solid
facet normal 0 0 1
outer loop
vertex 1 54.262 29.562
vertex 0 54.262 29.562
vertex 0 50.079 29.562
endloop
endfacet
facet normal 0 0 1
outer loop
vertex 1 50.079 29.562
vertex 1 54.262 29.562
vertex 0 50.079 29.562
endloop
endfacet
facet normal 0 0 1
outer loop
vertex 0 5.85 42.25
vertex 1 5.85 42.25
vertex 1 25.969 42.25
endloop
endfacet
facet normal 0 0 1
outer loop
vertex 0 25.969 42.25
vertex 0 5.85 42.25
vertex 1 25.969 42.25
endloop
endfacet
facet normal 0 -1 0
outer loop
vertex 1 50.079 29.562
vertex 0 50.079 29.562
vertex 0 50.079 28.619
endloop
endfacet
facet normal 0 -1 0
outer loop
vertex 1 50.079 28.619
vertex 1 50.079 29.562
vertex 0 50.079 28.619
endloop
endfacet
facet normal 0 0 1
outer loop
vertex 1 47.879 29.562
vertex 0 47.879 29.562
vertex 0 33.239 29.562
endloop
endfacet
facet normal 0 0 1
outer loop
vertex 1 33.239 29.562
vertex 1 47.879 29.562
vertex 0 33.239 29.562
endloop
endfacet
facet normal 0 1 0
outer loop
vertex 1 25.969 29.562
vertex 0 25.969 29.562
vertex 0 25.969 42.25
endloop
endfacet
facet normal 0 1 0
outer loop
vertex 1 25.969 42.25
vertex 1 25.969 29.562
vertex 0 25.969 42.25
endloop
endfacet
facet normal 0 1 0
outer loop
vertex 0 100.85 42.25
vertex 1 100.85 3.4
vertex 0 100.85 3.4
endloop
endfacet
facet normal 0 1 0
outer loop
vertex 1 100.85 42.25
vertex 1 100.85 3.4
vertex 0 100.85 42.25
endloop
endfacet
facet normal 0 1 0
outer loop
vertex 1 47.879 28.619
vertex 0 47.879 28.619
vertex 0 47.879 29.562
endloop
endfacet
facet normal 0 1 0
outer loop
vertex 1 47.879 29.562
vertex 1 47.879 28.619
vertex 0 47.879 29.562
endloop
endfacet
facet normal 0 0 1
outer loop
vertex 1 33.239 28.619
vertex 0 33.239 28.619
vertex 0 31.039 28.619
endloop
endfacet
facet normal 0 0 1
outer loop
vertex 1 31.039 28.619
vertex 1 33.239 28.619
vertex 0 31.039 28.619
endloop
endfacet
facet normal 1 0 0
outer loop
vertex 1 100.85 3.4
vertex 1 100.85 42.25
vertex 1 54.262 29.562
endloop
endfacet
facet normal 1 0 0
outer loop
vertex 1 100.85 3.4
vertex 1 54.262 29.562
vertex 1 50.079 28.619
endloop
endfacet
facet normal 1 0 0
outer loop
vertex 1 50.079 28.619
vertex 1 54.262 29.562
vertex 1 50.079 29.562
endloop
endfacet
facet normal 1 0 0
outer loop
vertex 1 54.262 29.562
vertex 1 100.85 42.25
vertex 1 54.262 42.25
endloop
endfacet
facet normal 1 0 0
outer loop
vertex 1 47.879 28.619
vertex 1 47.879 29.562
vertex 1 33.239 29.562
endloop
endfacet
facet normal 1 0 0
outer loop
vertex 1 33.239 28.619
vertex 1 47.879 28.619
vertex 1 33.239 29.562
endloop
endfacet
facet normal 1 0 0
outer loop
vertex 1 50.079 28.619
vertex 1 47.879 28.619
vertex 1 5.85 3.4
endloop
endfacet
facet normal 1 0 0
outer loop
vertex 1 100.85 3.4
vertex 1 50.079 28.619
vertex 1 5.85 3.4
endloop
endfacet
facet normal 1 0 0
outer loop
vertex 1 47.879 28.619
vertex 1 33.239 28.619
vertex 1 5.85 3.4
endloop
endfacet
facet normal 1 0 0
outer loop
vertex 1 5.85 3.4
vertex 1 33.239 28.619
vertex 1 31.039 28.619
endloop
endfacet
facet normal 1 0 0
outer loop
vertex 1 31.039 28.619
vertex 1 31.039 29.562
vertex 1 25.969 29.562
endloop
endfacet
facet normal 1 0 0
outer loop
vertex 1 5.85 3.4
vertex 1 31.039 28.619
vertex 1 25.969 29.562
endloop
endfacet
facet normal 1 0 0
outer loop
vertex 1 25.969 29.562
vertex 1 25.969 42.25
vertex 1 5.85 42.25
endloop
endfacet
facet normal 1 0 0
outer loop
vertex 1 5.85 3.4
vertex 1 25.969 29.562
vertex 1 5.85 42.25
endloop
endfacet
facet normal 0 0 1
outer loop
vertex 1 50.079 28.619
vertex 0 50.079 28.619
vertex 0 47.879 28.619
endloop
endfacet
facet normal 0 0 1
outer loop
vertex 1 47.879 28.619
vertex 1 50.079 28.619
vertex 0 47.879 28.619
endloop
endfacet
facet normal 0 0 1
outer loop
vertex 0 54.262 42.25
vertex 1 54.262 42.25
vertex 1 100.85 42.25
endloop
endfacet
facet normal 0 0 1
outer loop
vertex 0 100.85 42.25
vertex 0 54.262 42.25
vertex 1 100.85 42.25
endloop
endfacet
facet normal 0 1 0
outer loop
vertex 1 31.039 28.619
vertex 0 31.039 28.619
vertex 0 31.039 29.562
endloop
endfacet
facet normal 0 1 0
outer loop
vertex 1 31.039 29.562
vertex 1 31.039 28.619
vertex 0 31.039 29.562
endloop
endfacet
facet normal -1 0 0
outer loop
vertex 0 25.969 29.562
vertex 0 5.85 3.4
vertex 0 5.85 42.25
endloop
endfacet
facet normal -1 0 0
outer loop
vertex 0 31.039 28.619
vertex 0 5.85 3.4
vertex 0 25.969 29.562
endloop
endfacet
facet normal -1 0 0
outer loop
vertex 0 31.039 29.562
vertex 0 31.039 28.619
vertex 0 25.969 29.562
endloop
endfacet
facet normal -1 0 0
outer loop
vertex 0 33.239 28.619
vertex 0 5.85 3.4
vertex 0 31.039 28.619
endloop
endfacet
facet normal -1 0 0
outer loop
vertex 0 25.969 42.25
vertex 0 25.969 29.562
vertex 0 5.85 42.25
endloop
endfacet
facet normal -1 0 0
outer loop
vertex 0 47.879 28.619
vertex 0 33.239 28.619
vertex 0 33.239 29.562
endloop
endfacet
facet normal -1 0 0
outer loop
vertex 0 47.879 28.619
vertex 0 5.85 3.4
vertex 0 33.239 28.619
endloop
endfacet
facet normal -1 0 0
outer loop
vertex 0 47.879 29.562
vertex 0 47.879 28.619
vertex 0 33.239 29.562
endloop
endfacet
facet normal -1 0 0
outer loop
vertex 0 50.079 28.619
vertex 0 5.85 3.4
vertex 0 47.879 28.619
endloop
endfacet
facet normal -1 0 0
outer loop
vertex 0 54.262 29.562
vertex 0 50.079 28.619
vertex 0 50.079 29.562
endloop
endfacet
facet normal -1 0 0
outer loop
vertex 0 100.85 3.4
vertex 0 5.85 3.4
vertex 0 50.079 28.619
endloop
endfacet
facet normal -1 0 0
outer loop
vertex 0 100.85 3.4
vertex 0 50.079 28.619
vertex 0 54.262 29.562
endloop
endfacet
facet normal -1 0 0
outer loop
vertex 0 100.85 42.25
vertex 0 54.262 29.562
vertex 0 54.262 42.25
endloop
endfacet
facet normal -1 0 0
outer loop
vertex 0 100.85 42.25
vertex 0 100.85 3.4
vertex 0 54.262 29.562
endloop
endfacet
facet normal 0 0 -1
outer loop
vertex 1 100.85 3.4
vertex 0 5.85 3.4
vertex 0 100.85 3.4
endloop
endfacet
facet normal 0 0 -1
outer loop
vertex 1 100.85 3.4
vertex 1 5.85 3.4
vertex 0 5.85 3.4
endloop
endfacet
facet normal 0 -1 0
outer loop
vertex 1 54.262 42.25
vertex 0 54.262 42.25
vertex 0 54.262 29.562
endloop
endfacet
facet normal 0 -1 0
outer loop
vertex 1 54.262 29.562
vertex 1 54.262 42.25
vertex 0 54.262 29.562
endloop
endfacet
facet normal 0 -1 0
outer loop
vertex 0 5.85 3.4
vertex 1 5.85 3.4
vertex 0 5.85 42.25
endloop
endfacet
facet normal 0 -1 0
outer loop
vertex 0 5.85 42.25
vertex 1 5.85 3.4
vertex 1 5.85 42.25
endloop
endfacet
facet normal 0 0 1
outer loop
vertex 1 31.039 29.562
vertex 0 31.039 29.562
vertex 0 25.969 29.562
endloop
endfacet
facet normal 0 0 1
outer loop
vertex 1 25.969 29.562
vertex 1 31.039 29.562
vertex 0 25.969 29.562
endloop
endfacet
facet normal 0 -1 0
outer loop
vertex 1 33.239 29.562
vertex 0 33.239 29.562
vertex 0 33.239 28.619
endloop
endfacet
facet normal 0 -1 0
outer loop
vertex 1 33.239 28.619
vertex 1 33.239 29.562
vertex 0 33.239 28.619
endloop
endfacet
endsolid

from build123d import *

# Parameters (mm, degrees)
SKETCH_1_W          = 95
SKETCH_1_H          = 38.85
EXTRUDE_1_DEPTH     = 0.5
SKETCH_2_W          = 38.85
SKETCH_2_H          = 95
EXTRUDE_2_DEPTH     = 0.5
CUT_EXTRUDE_1_DEPTH = 110.347085009


with BuildPart() as part:
    # Эскиз1 → Бобышка-Вытянуть1 (new body)
    with BuildSketch(Plane(origin=(0.5, 0, 0), x_dir=(0, -1, 0), z_dir=(-1, 0, 0))):
        with Locations((-53.35, 22.825)):
            Rectangle(SKETCH_1_W, SKETCH_1_H)
    extrude(amount=-EXTRUDE_1_DEPTH)

    # Эскиз2 → Бобышка-Вытянуть2 (add)
    with BuildSketch(Plane.ZY.offset(-0.5)):
        with Locations((22.825, 53.35)):
            Rectangle(SKETCH_2_W, SKETCH_2_H)
    extrude(amount=EXTRUDE_2_DEPTH)

    # Эскиз3 → Вырез-Вытянуть1 (cut, through all)
    with BuildSketch(Plane.ZY):
        Polygon((47.187175015, 54.261978396), (29.562288031, 54.261978396), (29.562288031, 50.078726521), (28.618889228, 50.078726521), (28.618889228, 47.878726521), (29.562288031, 47.878726521), (29.562288031, 33.238726521), (28.618889228, 33.238726521), (28.618889228, 31.038726521), (29.562288031, 31.038726521), (29.562288031, 25.969159943), (47.187175015, 25.969159943), align=None)
    extrude(amount=-CUT_EXTRUDE_1_DEPTH, mode=Mode.SUBTRACT)


solid = part.part
